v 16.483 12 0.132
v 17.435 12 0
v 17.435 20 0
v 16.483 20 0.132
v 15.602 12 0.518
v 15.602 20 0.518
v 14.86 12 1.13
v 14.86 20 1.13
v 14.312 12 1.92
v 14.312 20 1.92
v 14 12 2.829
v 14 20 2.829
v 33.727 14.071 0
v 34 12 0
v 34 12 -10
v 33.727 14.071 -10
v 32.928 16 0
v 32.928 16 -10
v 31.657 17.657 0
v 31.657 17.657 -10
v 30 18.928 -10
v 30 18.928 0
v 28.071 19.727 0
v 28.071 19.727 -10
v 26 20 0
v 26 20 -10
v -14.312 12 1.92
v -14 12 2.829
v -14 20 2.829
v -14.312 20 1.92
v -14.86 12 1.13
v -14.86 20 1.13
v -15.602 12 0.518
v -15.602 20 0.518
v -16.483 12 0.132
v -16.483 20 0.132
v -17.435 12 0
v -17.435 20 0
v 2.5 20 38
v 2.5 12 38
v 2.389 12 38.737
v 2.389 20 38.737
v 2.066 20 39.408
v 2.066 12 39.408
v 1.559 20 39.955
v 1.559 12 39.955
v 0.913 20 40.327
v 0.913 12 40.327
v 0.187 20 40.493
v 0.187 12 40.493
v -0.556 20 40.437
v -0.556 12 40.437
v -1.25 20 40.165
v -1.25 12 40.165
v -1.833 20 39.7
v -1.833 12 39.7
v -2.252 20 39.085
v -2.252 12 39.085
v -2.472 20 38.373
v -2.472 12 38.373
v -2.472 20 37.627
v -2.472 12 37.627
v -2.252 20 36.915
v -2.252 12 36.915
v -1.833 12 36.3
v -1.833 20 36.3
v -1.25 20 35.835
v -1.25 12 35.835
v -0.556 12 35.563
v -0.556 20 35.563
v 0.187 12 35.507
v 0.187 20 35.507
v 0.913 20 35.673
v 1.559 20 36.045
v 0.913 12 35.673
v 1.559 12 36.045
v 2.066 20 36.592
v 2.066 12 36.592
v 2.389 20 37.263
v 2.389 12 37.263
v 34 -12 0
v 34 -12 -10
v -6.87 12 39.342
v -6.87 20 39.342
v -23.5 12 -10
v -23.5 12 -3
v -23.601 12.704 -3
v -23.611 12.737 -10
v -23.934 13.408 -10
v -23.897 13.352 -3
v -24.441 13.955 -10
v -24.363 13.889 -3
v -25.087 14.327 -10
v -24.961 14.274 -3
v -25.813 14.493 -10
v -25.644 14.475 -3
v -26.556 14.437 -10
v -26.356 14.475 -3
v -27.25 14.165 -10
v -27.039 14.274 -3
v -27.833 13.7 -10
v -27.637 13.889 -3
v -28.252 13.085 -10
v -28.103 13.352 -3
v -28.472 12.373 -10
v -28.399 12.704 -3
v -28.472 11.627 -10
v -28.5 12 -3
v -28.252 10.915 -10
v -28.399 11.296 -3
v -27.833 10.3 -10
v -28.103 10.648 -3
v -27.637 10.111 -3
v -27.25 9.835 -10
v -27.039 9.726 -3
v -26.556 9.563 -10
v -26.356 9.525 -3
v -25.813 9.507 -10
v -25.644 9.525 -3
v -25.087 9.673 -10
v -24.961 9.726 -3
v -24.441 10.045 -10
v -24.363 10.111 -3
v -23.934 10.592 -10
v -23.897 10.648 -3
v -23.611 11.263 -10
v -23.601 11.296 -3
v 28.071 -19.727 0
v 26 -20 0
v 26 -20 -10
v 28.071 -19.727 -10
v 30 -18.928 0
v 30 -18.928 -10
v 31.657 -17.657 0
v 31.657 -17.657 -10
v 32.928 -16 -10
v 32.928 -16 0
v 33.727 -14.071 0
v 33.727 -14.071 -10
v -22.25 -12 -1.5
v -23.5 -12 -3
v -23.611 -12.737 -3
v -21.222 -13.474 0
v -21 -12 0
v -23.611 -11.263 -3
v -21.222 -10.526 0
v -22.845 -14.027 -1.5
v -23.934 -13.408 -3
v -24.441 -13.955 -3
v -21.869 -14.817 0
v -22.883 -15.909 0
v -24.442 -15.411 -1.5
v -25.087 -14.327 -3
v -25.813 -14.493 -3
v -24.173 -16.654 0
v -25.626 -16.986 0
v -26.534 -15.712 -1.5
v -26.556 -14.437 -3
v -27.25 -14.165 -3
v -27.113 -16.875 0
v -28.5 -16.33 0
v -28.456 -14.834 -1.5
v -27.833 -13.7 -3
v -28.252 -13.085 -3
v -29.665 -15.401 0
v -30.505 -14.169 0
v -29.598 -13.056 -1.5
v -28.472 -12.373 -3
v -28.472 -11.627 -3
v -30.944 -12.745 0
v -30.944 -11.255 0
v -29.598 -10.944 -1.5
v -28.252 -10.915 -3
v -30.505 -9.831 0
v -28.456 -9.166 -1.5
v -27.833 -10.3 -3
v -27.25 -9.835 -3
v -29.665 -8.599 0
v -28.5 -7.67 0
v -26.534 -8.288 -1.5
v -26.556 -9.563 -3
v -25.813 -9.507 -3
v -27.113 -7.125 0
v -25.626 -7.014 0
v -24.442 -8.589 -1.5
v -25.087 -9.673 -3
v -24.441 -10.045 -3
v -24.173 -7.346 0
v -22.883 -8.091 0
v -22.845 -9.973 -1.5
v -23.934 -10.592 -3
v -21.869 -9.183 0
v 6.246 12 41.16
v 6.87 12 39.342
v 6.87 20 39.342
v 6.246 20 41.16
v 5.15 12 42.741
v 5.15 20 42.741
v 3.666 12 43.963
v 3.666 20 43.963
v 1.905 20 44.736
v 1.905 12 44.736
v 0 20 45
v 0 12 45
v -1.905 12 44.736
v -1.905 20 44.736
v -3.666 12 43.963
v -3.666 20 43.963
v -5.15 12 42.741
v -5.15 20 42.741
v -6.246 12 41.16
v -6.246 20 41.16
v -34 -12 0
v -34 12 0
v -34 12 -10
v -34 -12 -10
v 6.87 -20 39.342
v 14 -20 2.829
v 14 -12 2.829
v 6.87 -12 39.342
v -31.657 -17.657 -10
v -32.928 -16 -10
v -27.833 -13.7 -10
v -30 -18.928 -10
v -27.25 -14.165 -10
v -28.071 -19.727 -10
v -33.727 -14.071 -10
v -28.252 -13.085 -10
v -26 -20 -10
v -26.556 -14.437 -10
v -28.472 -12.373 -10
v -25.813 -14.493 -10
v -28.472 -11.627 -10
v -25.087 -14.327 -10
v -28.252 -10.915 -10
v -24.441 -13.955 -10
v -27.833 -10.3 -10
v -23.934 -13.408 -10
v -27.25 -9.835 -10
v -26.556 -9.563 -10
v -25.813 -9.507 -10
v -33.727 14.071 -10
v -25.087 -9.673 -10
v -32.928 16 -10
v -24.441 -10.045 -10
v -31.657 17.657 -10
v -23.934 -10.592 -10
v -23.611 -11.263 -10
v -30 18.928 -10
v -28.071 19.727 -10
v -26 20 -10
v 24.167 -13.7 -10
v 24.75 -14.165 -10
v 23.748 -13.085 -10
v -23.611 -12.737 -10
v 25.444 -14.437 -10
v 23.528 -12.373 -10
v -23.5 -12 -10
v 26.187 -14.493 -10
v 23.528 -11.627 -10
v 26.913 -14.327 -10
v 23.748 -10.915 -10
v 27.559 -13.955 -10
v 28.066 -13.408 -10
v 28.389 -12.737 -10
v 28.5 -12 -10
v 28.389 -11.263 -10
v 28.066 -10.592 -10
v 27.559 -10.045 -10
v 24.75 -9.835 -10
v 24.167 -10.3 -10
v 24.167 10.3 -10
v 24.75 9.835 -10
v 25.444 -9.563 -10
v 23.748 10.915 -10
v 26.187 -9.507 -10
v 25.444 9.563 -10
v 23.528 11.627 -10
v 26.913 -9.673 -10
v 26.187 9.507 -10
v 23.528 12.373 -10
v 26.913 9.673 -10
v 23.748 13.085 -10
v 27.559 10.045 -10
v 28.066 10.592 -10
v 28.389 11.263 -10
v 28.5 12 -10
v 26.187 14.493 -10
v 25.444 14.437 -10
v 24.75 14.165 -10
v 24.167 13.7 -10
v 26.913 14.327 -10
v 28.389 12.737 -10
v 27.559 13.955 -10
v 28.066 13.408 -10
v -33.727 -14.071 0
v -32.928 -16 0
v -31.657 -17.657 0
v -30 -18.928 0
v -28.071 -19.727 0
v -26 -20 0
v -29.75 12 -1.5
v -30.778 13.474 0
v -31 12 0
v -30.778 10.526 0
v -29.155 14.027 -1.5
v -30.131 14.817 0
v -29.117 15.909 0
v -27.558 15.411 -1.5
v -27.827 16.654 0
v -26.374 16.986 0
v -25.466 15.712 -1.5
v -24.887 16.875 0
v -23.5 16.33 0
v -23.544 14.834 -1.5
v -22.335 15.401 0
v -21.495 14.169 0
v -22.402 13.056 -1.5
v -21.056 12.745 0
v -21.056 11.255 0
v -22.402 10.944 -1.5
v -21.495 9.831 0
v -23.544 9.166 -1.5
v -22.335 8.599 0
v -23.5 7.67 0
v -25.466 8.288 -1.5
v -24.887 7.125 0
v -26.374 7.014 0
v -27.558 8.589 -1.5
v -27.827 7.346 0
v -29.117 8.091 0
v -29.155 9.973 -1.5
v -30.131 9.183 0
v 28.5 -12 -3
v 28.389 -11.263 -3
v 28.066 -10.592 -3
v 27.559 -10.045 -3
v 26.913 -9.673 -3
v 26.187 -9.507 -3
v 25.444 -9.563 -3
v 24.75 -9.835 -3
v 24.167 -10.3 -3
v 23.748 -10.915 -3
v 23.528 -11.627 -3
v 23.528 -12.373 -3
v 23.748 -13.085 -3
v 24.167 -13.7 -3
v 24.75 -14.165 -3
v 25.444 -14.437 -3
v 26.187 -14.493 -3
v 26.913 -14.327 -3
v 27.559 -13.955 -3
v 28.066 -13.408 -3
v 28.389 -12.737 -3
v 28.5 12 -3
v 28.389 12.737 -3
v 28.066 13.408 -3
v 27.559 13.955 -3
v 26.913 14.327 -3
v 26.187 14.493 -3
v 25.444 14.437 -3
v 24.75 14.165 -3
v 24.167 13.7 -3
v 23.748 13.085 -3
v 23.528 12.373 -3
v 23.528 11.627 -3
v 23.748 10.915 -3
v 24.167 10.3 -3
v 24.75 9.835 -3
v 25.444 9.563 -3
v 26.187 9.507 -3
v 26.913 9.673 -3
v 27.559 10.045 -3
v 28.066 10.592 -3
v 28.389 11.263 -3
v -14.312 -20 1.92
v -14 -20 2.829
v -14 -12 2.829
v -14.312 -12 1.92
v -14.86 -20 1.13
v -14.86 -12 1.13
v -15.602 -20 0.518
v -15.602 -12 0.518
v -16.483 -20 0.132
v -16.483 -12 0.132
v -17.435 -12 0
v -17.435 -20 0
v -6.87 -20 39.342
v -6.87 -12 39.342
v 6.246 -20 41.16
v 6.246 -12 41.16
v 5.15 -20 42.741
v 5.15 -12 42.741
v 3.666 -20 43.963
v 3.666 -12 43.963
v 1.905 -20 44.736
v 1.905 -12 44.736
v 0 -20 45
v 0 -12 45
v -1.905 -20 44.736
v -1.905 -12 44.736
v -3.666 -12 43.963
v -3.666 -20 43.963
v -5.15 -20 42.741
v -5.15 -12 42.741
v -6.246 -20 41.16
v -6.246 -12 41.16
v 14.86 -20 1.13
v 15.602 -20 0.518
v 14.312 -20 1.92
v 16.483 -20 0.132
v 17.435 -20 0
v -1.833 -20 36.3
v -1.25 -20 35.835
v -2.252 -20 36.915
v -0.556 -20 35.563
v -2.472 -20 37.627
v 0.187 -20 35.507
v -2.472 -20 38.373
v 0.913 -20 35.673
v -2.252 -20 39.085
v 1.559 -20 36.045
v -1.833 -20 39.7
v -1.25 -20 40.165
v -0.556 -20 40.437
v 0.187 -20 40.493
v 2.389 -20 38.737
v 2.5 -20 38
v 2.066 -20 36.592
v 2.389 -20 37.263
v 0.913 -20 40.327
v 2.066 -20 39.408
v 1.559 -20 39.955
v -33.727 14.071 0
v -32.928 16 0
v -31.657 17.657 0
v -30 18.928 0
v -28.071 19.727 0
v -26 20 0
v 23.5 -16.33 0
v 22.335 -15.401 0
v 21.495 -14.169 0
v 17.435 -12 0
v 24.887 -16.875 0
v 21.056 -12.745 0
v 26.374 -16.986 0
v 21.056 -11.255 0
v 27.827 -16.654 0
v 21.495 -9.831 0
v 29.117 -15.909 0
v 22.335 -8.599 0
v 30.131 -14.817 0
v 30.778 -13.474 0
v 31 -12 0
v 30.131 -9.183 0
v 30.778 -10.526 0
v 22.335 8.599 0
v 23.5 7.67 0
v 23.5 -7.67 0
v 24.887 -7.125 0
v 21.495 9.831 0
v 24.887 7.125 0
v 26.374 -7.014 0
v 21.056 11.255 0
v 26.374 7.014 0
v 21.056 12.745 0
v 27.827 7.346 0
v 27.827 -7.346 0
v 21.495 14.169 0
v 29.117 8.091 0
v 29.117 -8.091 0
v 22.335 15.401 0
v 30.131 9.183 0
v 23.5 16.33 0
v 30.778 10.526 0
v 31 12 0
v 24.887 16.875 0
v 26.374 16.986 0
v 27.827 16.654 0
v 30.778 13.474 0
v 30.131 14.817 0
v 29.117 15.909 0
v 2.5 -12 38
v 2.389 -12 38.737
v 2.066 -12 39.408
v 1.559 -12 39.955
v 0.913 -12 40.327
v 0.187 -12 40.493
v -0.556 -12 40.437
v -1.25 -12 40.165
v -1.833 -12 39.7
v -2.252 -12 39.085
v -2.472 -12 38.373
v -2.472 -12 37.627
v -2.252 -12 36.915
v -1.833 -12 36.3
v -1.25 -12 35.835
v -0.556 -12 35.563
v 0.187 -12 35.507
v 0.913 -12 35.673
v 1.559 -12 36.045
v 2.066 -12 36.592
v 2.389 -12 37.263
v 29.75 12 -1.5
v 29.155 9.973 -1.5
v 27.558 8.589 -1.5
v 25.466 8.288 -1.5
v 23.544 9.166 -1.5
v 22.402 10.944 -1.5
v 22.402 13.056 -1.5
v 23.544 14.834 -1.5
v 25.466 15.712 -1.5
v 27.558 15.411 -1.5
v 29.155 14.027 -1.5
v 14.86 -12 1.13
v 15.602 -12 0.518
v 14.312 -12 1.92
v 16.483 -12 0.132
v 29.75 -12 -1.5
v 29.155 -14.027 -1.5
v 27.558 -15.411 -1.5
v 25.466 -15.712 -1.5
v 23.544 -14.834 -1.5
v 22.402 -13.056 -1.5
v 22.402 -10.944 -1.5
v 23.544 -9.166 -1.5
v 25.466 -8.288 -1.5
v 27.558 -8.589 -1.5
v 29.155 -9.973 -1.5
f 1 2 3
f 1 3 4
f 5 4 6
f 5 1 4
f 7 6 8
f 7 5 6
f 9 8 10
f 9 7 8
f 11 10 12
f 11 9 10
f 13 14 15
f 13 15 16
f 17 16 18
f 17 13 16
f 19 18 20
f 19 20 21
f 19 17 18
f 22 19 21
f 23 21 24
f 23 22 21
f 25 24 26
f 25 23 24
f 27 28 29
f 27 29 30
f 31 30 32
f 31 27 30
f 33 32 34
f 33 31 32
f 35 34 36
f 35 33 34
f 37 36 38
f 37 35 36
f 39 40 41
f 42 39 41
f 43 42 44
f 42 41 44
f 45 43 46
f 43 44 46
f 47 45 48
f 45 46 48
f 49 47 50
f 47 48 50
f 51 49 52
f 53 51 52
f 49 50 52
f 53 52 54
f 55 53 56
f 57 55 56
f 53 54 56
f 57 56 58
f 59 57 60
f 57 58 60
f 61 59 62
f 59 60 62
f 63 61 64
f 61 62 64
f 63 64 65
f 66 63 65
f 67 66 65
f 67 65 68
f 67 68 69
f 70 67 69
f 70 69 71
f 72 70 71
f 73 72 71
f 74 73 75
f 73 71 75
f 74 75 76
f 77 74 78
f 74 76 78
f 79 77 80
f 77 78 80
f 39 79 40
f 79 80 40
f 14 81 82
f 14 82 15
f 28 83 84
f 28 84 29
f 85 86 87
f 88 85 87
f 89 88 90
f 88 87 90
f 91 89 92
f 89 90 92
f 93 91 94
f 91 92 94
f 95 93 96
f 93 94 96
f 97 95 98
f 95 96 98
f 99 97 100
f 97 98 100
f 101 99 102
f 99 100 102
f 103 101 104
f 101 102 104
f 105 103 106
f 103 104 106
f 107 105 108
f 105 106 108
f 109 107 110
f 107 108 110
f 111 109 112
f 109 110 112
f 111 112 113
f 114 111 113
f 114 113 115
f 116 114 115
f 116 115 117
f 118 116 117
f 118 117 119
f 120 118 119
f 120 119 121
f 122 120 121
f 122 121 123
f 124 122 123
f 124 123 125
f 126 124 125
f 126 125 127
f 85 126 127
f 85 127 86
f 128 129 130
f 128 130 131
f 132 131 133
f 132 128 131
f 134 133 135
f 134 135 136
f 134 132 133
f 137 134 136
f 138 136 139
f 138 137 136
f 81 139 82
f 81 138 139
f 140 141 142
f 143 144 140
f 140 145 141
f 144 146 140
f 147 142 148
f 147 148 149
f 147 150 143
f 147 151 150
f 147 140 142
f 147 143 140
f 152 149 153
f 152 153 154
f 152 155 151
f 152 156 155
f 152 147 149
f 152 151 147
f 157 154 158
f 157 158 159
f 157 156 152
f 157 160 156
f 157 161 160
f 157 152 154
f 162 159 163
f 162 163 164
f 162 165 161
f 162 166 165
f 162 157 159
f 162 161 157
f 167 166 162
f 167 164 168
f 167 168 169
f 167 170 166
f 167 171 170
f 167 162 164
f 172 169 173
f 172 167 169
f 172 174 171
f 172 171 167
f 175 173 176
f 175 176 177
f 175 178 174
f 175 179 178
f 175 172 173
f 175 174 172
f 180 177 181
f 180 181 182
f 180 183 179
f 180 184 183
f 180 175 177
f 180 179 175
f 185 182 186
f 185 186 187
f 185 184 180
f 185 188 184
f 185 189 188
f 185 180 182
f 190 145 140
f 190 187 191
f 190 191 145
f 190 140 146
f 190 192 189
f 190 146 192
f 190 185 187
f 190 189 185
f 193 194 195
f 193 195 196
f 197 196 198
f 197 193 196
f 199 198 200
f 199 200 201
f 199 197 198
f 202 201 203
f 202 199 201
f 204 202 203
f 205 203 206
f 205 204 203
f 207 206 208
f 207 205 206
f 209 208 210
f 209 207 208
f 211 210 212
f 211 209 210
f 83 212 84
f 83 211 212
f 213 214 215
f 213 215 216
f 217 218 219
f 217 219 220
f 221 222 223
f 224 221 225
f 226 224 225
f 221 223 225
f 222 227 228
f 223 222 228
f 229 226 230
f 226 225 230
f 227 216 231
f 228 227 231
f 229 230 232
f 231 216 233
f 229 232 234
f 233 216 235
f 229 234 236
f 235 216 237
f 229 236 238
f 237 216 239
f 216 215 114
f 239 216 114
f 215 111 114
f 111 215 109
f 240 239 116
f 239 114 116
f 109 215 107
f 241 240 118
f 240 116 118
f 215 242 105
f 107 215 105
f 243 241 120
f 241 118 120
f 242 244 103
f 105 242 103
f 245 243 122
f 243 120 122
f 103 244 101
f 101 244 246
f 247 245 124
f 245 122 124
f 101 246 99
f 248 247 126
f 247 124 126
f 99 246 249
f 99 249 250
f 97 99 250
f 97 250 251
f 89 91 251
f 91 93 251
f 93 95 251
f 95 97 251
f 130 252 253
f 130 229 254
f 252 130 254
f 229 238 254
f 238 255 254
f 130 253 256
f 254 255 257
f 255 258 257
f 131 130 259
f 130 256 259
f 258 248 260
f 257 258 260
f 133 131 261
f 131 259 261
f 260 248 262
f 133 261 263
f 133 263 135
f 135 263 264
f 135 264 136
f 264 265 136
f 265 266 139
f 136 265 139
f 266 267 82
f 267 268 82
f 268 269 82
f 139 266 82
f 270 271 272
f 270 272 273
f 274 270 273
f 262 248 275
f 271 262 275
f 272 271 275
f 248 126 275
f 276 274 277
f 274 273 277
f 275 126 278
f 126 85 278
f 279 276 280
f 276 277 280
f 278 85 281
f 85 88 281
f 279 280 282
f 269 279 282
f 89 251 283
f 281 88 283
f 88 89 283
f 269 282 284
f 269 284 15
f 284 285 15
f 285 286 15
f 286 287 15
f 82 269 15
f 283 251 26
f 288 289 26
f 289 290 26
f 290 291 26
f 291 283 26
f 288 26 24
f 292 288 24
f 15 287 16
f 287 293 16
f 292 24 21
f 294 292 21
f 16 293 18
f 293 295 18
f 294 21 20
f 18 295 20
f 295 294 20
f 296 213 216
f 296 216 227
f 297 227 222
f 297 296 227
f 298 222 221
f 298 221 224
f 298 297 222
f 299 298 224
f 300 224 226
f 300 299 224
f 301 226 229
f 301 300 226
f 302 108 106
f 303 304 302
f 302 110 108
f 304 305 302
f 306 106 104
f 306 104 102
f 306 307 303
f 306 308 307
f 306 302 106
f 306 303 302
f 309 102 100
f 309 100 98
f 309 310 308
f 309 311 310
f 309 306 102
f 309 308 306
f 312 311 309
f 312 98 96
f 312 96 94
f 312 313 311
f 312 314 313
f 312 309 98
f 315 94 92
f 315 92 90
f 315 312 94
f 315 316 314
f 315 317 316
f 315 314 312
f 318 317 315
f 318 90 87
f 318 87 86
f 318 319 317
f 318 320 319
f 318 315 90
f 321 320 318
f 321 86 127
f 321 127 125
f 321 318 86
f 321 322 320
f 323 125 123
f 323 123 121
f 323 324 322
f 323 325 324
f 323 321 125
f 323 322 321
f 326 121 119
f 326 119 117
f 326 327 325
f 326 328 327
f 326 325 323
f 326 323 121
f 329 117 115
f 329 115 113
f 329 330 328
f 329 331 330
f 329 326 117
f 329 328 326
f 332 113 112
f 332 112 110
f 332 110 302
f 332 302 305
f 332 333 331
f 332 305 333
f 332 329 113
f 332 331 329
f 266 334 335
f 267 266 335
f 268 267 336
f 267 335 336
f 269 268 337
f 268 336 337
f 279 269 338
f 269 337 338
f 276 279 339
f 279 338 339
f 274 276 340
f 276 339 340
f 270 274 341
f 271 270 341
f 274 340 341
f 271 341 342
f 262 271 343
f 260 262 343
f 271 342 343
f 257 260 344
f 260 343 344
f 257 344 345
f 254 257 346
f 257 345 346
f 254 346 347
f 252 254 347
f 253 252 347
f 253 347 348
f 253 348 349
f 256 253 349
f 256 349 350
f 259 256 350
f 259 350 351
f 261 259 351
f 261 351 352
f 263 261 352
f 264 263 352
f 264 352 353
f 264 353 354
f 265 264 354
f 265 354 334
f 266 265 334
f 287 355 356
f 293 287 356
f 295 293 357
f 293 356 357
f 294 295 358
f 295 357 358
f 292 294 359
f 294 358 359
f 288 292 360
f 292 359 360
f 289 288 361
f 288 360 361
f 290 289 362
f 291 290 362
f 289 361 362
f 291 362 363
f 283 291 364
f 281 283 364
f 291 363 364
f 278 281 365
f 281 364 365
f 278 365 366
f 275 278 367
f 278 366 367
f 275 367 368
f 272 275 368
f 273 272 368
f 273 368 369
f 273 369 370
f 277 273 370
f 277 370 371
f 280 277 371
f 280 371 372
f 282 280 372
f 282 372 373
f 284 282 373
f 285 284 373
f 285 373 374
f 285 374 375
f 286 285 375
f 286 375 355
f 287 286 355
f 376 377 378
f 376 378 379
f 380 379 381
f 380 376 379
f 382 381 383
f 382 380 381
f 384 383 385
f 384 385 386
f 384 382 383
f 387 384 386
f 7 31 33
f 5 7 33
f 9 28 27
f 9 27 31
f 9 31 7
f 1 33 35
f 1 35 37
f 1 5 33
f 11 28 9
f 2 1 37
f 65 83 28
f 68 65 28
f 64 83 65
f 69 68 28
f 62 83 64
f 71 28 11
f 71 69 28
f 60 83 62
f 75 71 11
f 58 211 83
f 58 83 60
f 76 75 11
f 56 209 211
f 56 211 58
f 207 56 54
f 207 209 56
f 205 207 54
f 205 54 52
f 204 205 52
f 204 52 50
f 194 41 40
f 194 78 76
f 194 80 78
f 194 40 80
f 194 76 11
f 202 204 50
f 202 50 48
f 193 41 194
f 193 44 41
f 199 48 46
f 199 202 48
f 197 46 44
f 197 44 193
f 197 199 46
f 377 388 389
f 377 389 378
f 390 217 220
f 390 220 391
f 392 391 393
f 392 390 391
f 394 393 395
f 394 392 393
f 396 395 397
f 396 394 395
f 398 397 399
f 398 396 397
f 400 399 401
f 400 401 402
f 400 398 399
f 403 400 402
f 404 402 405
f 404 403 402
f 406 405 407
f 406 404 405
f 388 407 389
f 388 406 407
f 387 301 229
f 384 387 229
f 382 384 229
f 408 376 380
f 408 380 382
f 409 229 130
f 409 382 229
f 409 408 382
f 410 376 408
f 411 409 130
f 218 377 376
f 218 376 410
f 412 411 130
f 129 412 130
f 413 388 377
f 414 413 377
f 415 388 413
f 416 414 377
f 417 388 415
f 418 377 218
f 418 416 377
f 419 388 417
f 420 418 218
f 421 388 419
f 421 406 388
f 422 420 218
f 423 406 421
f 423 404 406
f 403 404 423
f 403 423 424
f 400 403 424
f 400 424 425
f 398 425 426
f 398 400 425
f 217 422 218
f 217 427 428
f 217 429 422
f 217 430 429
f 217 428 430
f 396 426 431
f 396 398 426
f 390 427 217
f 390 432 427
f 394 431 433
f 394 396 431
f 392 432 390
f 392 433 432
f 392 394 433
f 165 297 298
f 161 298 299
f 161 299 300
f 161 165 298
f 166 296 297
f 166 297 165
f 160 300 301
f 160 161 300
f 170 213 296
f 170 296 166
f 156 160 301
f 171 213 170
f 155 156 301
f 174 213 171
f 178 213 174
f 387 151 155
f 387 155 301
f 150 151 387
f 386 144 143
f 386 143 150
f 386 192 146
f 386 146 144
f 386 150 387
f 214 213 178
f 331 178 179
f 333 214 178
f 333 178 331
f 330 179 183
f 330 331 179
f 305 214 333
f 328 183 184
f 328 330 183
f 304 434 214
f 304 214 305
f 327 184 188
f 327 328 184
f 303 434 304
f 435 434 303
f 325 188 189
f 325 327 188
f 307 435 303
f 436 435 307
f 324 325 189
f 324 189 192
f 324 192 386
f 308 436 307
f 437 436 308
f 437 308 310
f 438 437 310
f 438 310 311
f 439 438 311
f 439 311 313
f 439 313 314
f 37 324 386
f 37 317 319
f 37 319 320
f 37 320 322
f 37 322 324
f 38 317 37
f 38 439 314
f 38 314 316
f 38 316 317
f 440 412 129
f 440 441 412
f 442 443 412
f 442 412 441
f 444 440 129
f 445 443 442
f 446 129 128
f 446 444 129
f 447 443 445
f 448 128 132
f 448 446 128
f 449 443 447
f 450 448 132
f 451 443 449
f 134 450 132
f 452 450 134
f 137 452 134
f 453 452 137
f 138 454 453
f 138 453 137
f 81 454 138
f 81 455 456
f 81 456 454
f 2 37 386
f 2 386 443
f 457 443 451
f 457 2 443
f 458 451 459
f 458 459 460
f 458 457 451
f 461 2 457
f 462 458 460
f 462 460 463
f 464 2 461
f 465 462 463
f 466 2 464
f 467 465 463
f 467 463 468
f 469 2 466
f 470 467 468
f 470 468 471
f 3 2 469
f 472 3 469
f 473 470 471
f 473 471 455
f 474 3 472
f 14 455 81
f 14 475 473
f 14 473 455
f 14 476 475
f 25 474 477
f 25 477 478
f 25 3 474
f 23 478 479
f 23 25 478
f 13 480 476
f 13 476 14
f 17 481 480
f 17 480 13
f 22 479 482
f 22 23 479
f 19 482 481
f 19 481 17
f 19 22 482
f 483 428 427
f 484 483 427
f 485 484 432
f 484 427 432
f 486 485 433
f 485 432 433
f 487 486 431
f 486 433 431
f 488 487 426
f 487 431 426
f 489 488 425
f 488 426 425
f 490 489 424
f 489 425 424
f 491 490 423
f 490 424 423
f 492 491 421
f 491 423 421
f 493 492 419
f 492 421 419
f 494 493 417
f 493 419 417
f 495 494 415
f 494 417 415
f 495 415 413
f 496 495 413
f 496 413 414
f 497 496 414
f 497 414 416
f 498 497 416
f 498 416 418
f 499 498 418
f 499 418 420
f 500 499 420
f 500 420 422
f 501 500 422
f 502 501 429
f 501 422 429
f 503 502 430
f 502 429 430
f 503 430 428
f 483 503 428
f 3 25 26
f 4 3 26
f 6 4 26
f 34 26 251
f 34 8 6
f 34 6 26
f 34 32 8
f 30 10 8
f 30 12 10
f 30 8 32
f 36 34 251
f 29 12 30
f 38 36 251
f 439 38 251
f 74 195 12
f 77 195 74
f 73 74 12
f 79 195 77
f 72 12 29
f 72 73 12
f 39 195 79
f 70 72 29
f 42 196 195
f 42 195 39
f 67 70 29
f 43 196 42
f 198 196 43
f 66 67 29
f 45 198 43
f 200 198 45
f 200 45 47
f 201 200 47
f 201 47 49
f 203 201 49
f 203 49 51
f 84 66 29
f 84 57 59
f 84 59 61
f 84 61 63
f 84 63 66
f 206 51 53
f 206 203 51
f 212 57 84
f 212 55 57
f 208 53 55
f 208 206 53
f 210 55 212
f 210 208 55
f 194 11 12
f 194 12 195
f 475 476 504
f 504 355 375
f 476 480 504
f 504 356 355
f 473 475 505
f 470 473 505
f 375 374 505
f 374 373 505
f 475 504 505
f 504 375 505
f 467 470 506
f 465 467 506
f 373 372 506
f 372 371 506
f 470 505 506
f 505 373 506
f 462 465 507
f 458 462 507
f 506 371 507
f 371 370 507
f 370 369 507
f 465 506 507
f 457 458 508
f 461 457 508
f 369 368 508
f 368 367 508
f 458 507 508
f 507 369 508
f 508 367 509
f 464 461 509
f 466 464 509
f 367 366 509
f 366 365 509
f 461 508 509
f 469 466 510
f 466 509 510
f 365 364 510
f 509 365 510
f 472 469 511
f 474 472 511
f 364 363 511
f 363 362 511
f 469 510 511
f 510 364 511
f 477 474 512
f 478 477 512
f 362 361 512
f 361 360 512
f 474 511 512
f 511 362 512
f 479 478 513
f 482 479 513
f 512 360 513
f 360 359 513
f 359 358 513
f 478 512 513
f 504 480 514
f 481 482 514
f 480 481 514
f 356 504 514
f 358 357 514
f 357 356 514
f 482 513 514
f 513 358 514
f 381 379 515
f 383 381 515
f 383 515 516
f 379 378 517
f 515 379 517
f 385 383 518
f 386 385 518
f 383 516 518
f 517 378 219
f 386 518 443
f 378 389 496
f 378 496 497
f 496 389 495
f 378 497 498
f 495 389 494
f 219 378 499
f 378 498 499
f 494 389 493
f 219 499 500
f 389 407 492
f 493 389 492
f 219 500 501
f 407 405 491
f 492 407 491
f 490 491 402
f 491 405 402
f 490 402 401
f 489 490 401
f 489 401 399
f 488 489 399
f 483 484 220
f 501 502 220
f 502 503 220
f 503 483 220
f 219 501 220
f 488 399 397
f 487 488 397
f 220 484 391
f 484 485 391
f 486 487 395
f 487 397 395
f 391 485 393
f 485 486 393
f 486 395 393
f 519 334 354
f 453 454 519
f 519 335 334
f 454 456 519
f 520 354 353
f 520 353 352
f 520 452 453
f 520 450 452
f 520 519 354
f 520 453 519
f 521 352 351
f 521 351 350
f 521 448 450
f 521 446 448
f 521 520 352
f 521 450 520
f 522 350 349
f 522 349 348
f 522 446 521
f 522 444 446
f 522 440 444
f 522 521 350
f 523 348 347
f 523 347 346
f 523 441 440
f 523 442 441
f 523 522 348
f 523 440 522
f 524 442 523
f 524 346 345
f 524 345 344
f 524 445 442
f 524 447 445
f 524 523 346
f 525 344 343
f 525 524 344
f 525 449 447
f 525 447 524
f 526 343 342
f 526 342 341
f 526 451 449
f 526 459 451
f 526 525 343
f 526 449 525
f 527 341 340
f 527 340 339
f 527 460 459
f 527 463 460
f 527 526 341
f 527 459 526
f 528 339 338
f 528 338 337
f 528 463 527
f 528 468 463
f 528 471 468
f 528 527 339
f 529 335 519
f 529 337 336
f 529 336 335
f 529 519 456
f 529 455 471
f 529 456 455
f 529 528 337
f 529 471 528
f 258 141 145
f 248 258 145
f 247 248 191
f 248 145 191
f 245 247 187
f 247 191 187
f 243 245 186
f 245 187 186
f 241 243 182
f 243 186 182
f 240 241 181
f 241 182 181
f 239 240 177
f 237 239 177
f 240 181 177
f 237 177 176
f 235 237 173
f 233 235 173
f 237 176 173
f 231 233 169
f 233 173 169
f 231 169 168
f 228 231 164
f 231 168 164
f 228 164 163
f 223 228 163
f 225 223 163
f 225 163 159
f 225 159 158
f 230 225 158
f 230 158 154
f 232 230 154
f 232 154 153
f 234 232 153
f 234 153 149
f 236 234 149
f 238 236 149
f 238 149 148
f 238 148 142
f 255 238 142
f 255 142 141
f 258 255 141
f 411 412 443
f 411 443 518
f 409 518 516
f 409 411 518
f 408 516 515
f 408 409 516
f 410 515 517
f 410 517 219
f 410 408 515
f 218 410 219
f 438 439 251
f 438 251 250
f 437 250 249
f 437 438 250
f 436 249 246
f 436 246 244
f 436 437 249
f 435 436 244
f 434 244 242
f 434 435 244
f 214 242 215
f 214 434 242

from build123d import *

# Parameters (mm, degrees)
F1_DEPTH = 10
F2_R     = 2.5
F3_DEPTH = 25
F4_R     = 2.5
F5_DEPTH = 8
F6_START = -32
F6_DEPTH = 8


with BuildPart() as f1:
    # F0 (on Top) → F1 (new body)
    with BuildSketch(Plane.XY):
        with BuildLine():
            ThreePointArc((34, 12), (31.6568542495, 17.6568542495), (26, 20))
            Line((26, 20), (-26, 20))
            ThreePointArc((-26, 20), (-31.6568542495, 17.6568542495), (-34, 12))
            Line((-34, 12), (-34, -12))
            ThreePointArc((-34, -12), (-31.6568542495, -17.6568542495), (-26, -20))
            Line((-26, -20), (26, -20))
            ThreePointArc((26, -20), (31.6568542495, -17.6568542495), (34, -12))
            Line((34, -12), (34, 12))
        make_face()
    extrude(amount=-F1_DEPTH)

    # F2 (on face) → F3 (cut)
    with BuildSketch(Plane.XY):
        with Locations((-26, 12)):
            Circle(F2_R)
        with Locations((-26, -12)):
            Circle(F2_R)
        with Locations((26, -12)):
            Circle(F2_R)
        with Locations((26, 12)):
            Circle(F2_R)
    extrude(amount=-F3_DEPTH, mode=Mode.SUBTRACT)

    # F4 (on face) → F5 (join)
    with BuildSketch(Plane.XZ.offset(20)):
        with BuildLine():
            ThreePointArc((6.870243072, 39.3415513897), (6.9674852531, 38.6739059637), (7, 38))
            ThreePointArc((7, 38), (-0.6739059637, 31.0325147469), (-6.870243072, 39.3415513897))
            Line((-6.870243072, 39.3415513897), (-14, 2.8292243052))
            ThreePointArc((-14, 2.8292243052), (-15.2100052393, 0.7983602265), (-17.435121536, 0))
            Line((-17.435121536, 0), (0, 0))
            Line((0, 0), (17.435121536, 0))
            ThreePointArc((17.435121536, 0), (15.2100052393, 0.7983602265), (14, 2.8292243052))
            Line((14, 2.8292243052), (6.870243072, 39.3415513897))
        make_face()
        with BuildLine():
            ThreePointArc((-6.870243072, 39.3415513897), (-0.6739059637, 31.0325147469), (7, 38))
            ThreePointArc((7, 38), (6.9674852531, 38.6739059637), (6.870243072, 39.3415513897))
            ThreePointArc((6.870243072, 39.3415513897), (0, 45), (-6.870243072, 39.3415513897))
        make_face()
        with Locations((0, 38)):
            Circle(F4_R, mode=Mode.SUBTRACT)
    extrude(amount=-F5_DEPTH)

    # F4 (on face) → F6 (join)
    with BuildSketch(Plane.XZ.offset(20).offset(F6_START)):
        with BuildLine():
            ThreePointArc((-6.870243072, 39.3415513897), (-0.6739059637, 31.0325147469), (7, 38))
            ThreePointArc((7, 38), (6.9674852531, 38.6739059637), (6.870243072, 39.3415513897))
            ThreePointArc((6.870243072, 39.3415513897), (0, 45), (-6.870243072, 39.3415513897))
        make_face()
        with Locations((0, 38)):
            Circle(F4_R, mode=Mode.SUBTRACT)
        with BuildLine():
            ThreePointArc((6.870243072, 39.3415513897), (6.9674852531, 38.6739059637), (7, 38))
            ThreePointArc((7, 38), (-0.6739059637, 31.0325147469), (-6.870243072, 39.3415513897))
            Line((-6.870243072, 39.3415513897), (-14, 2.8292243052))
            ThreePointArc((-14, 2.8292243052), (-15.2100052393, 0.7983602265), (-17.435121536, 0))
            Line((-17.435121536, 0), (0, 0))
            Line((0, 0), (17.435121536, 0))
            ThreePointArc((17.435121536, 0), (15.2100052393, 0.7983602265), (14, 2.8292243052))
            Line((14, 2.8292243052), (6.870243072, 39.3415513897))
        make_face()
    extrude(amount=-F6_DEPTH)

    # F8 (on offset) → F9 (revolve, cut)
    with BuildSketch(Plane.XZ.offset(12)):
        Polygon((-21, 0), (-26, 0), (-26, -3), (-23.5, -3), align=None)
    revolve(axis=Axis((-26, -12, -1.5), (0, 0, -1)), mode=Mode.SUBTRACT)

    # F10 (on offset) → F11 (revolve, cut)
    with BuildSketch(Plane.XZ.offset(12)):
        Polygon((31, 0), (26, 0), (26, -3), (28.5, -3), align=None)
    revolve(axis=Axis((26, -12, -1.5), (0, 0, -1)), mode=Mode.SUBTRACT)

    # F13 (on offset) → F14 (revolve, cut)
    with BuildSketch(Plane(origin=(0, 12, 0), x_dir=(-1, 0, 0), z_dir=(0, 1, 0))):
        Polygon((-26, -3), (-26, 0), (-31, 0), (-28.5, -3), align=None)
    revolve(axis=Axis((26, 12, -1.5), (0, 0, -1)), mode=Mode.SUBTRACT)

    # F15 (on offset) → F16 (revolve, cut)
    with BuildSketch(Plane(origin=(0, 12, 0), x_dir=(-1, 0, 0), z_dir=(0, 1, 0))):
        Polygon((31, 0), (26, 0), (26, -3), (28.5, -3), align=None)
    revolve(axis=Axis((-26, 12, -1.5), (0, 0, -1)), mode=Mode.SUBTRACT)


solid = f1.part
